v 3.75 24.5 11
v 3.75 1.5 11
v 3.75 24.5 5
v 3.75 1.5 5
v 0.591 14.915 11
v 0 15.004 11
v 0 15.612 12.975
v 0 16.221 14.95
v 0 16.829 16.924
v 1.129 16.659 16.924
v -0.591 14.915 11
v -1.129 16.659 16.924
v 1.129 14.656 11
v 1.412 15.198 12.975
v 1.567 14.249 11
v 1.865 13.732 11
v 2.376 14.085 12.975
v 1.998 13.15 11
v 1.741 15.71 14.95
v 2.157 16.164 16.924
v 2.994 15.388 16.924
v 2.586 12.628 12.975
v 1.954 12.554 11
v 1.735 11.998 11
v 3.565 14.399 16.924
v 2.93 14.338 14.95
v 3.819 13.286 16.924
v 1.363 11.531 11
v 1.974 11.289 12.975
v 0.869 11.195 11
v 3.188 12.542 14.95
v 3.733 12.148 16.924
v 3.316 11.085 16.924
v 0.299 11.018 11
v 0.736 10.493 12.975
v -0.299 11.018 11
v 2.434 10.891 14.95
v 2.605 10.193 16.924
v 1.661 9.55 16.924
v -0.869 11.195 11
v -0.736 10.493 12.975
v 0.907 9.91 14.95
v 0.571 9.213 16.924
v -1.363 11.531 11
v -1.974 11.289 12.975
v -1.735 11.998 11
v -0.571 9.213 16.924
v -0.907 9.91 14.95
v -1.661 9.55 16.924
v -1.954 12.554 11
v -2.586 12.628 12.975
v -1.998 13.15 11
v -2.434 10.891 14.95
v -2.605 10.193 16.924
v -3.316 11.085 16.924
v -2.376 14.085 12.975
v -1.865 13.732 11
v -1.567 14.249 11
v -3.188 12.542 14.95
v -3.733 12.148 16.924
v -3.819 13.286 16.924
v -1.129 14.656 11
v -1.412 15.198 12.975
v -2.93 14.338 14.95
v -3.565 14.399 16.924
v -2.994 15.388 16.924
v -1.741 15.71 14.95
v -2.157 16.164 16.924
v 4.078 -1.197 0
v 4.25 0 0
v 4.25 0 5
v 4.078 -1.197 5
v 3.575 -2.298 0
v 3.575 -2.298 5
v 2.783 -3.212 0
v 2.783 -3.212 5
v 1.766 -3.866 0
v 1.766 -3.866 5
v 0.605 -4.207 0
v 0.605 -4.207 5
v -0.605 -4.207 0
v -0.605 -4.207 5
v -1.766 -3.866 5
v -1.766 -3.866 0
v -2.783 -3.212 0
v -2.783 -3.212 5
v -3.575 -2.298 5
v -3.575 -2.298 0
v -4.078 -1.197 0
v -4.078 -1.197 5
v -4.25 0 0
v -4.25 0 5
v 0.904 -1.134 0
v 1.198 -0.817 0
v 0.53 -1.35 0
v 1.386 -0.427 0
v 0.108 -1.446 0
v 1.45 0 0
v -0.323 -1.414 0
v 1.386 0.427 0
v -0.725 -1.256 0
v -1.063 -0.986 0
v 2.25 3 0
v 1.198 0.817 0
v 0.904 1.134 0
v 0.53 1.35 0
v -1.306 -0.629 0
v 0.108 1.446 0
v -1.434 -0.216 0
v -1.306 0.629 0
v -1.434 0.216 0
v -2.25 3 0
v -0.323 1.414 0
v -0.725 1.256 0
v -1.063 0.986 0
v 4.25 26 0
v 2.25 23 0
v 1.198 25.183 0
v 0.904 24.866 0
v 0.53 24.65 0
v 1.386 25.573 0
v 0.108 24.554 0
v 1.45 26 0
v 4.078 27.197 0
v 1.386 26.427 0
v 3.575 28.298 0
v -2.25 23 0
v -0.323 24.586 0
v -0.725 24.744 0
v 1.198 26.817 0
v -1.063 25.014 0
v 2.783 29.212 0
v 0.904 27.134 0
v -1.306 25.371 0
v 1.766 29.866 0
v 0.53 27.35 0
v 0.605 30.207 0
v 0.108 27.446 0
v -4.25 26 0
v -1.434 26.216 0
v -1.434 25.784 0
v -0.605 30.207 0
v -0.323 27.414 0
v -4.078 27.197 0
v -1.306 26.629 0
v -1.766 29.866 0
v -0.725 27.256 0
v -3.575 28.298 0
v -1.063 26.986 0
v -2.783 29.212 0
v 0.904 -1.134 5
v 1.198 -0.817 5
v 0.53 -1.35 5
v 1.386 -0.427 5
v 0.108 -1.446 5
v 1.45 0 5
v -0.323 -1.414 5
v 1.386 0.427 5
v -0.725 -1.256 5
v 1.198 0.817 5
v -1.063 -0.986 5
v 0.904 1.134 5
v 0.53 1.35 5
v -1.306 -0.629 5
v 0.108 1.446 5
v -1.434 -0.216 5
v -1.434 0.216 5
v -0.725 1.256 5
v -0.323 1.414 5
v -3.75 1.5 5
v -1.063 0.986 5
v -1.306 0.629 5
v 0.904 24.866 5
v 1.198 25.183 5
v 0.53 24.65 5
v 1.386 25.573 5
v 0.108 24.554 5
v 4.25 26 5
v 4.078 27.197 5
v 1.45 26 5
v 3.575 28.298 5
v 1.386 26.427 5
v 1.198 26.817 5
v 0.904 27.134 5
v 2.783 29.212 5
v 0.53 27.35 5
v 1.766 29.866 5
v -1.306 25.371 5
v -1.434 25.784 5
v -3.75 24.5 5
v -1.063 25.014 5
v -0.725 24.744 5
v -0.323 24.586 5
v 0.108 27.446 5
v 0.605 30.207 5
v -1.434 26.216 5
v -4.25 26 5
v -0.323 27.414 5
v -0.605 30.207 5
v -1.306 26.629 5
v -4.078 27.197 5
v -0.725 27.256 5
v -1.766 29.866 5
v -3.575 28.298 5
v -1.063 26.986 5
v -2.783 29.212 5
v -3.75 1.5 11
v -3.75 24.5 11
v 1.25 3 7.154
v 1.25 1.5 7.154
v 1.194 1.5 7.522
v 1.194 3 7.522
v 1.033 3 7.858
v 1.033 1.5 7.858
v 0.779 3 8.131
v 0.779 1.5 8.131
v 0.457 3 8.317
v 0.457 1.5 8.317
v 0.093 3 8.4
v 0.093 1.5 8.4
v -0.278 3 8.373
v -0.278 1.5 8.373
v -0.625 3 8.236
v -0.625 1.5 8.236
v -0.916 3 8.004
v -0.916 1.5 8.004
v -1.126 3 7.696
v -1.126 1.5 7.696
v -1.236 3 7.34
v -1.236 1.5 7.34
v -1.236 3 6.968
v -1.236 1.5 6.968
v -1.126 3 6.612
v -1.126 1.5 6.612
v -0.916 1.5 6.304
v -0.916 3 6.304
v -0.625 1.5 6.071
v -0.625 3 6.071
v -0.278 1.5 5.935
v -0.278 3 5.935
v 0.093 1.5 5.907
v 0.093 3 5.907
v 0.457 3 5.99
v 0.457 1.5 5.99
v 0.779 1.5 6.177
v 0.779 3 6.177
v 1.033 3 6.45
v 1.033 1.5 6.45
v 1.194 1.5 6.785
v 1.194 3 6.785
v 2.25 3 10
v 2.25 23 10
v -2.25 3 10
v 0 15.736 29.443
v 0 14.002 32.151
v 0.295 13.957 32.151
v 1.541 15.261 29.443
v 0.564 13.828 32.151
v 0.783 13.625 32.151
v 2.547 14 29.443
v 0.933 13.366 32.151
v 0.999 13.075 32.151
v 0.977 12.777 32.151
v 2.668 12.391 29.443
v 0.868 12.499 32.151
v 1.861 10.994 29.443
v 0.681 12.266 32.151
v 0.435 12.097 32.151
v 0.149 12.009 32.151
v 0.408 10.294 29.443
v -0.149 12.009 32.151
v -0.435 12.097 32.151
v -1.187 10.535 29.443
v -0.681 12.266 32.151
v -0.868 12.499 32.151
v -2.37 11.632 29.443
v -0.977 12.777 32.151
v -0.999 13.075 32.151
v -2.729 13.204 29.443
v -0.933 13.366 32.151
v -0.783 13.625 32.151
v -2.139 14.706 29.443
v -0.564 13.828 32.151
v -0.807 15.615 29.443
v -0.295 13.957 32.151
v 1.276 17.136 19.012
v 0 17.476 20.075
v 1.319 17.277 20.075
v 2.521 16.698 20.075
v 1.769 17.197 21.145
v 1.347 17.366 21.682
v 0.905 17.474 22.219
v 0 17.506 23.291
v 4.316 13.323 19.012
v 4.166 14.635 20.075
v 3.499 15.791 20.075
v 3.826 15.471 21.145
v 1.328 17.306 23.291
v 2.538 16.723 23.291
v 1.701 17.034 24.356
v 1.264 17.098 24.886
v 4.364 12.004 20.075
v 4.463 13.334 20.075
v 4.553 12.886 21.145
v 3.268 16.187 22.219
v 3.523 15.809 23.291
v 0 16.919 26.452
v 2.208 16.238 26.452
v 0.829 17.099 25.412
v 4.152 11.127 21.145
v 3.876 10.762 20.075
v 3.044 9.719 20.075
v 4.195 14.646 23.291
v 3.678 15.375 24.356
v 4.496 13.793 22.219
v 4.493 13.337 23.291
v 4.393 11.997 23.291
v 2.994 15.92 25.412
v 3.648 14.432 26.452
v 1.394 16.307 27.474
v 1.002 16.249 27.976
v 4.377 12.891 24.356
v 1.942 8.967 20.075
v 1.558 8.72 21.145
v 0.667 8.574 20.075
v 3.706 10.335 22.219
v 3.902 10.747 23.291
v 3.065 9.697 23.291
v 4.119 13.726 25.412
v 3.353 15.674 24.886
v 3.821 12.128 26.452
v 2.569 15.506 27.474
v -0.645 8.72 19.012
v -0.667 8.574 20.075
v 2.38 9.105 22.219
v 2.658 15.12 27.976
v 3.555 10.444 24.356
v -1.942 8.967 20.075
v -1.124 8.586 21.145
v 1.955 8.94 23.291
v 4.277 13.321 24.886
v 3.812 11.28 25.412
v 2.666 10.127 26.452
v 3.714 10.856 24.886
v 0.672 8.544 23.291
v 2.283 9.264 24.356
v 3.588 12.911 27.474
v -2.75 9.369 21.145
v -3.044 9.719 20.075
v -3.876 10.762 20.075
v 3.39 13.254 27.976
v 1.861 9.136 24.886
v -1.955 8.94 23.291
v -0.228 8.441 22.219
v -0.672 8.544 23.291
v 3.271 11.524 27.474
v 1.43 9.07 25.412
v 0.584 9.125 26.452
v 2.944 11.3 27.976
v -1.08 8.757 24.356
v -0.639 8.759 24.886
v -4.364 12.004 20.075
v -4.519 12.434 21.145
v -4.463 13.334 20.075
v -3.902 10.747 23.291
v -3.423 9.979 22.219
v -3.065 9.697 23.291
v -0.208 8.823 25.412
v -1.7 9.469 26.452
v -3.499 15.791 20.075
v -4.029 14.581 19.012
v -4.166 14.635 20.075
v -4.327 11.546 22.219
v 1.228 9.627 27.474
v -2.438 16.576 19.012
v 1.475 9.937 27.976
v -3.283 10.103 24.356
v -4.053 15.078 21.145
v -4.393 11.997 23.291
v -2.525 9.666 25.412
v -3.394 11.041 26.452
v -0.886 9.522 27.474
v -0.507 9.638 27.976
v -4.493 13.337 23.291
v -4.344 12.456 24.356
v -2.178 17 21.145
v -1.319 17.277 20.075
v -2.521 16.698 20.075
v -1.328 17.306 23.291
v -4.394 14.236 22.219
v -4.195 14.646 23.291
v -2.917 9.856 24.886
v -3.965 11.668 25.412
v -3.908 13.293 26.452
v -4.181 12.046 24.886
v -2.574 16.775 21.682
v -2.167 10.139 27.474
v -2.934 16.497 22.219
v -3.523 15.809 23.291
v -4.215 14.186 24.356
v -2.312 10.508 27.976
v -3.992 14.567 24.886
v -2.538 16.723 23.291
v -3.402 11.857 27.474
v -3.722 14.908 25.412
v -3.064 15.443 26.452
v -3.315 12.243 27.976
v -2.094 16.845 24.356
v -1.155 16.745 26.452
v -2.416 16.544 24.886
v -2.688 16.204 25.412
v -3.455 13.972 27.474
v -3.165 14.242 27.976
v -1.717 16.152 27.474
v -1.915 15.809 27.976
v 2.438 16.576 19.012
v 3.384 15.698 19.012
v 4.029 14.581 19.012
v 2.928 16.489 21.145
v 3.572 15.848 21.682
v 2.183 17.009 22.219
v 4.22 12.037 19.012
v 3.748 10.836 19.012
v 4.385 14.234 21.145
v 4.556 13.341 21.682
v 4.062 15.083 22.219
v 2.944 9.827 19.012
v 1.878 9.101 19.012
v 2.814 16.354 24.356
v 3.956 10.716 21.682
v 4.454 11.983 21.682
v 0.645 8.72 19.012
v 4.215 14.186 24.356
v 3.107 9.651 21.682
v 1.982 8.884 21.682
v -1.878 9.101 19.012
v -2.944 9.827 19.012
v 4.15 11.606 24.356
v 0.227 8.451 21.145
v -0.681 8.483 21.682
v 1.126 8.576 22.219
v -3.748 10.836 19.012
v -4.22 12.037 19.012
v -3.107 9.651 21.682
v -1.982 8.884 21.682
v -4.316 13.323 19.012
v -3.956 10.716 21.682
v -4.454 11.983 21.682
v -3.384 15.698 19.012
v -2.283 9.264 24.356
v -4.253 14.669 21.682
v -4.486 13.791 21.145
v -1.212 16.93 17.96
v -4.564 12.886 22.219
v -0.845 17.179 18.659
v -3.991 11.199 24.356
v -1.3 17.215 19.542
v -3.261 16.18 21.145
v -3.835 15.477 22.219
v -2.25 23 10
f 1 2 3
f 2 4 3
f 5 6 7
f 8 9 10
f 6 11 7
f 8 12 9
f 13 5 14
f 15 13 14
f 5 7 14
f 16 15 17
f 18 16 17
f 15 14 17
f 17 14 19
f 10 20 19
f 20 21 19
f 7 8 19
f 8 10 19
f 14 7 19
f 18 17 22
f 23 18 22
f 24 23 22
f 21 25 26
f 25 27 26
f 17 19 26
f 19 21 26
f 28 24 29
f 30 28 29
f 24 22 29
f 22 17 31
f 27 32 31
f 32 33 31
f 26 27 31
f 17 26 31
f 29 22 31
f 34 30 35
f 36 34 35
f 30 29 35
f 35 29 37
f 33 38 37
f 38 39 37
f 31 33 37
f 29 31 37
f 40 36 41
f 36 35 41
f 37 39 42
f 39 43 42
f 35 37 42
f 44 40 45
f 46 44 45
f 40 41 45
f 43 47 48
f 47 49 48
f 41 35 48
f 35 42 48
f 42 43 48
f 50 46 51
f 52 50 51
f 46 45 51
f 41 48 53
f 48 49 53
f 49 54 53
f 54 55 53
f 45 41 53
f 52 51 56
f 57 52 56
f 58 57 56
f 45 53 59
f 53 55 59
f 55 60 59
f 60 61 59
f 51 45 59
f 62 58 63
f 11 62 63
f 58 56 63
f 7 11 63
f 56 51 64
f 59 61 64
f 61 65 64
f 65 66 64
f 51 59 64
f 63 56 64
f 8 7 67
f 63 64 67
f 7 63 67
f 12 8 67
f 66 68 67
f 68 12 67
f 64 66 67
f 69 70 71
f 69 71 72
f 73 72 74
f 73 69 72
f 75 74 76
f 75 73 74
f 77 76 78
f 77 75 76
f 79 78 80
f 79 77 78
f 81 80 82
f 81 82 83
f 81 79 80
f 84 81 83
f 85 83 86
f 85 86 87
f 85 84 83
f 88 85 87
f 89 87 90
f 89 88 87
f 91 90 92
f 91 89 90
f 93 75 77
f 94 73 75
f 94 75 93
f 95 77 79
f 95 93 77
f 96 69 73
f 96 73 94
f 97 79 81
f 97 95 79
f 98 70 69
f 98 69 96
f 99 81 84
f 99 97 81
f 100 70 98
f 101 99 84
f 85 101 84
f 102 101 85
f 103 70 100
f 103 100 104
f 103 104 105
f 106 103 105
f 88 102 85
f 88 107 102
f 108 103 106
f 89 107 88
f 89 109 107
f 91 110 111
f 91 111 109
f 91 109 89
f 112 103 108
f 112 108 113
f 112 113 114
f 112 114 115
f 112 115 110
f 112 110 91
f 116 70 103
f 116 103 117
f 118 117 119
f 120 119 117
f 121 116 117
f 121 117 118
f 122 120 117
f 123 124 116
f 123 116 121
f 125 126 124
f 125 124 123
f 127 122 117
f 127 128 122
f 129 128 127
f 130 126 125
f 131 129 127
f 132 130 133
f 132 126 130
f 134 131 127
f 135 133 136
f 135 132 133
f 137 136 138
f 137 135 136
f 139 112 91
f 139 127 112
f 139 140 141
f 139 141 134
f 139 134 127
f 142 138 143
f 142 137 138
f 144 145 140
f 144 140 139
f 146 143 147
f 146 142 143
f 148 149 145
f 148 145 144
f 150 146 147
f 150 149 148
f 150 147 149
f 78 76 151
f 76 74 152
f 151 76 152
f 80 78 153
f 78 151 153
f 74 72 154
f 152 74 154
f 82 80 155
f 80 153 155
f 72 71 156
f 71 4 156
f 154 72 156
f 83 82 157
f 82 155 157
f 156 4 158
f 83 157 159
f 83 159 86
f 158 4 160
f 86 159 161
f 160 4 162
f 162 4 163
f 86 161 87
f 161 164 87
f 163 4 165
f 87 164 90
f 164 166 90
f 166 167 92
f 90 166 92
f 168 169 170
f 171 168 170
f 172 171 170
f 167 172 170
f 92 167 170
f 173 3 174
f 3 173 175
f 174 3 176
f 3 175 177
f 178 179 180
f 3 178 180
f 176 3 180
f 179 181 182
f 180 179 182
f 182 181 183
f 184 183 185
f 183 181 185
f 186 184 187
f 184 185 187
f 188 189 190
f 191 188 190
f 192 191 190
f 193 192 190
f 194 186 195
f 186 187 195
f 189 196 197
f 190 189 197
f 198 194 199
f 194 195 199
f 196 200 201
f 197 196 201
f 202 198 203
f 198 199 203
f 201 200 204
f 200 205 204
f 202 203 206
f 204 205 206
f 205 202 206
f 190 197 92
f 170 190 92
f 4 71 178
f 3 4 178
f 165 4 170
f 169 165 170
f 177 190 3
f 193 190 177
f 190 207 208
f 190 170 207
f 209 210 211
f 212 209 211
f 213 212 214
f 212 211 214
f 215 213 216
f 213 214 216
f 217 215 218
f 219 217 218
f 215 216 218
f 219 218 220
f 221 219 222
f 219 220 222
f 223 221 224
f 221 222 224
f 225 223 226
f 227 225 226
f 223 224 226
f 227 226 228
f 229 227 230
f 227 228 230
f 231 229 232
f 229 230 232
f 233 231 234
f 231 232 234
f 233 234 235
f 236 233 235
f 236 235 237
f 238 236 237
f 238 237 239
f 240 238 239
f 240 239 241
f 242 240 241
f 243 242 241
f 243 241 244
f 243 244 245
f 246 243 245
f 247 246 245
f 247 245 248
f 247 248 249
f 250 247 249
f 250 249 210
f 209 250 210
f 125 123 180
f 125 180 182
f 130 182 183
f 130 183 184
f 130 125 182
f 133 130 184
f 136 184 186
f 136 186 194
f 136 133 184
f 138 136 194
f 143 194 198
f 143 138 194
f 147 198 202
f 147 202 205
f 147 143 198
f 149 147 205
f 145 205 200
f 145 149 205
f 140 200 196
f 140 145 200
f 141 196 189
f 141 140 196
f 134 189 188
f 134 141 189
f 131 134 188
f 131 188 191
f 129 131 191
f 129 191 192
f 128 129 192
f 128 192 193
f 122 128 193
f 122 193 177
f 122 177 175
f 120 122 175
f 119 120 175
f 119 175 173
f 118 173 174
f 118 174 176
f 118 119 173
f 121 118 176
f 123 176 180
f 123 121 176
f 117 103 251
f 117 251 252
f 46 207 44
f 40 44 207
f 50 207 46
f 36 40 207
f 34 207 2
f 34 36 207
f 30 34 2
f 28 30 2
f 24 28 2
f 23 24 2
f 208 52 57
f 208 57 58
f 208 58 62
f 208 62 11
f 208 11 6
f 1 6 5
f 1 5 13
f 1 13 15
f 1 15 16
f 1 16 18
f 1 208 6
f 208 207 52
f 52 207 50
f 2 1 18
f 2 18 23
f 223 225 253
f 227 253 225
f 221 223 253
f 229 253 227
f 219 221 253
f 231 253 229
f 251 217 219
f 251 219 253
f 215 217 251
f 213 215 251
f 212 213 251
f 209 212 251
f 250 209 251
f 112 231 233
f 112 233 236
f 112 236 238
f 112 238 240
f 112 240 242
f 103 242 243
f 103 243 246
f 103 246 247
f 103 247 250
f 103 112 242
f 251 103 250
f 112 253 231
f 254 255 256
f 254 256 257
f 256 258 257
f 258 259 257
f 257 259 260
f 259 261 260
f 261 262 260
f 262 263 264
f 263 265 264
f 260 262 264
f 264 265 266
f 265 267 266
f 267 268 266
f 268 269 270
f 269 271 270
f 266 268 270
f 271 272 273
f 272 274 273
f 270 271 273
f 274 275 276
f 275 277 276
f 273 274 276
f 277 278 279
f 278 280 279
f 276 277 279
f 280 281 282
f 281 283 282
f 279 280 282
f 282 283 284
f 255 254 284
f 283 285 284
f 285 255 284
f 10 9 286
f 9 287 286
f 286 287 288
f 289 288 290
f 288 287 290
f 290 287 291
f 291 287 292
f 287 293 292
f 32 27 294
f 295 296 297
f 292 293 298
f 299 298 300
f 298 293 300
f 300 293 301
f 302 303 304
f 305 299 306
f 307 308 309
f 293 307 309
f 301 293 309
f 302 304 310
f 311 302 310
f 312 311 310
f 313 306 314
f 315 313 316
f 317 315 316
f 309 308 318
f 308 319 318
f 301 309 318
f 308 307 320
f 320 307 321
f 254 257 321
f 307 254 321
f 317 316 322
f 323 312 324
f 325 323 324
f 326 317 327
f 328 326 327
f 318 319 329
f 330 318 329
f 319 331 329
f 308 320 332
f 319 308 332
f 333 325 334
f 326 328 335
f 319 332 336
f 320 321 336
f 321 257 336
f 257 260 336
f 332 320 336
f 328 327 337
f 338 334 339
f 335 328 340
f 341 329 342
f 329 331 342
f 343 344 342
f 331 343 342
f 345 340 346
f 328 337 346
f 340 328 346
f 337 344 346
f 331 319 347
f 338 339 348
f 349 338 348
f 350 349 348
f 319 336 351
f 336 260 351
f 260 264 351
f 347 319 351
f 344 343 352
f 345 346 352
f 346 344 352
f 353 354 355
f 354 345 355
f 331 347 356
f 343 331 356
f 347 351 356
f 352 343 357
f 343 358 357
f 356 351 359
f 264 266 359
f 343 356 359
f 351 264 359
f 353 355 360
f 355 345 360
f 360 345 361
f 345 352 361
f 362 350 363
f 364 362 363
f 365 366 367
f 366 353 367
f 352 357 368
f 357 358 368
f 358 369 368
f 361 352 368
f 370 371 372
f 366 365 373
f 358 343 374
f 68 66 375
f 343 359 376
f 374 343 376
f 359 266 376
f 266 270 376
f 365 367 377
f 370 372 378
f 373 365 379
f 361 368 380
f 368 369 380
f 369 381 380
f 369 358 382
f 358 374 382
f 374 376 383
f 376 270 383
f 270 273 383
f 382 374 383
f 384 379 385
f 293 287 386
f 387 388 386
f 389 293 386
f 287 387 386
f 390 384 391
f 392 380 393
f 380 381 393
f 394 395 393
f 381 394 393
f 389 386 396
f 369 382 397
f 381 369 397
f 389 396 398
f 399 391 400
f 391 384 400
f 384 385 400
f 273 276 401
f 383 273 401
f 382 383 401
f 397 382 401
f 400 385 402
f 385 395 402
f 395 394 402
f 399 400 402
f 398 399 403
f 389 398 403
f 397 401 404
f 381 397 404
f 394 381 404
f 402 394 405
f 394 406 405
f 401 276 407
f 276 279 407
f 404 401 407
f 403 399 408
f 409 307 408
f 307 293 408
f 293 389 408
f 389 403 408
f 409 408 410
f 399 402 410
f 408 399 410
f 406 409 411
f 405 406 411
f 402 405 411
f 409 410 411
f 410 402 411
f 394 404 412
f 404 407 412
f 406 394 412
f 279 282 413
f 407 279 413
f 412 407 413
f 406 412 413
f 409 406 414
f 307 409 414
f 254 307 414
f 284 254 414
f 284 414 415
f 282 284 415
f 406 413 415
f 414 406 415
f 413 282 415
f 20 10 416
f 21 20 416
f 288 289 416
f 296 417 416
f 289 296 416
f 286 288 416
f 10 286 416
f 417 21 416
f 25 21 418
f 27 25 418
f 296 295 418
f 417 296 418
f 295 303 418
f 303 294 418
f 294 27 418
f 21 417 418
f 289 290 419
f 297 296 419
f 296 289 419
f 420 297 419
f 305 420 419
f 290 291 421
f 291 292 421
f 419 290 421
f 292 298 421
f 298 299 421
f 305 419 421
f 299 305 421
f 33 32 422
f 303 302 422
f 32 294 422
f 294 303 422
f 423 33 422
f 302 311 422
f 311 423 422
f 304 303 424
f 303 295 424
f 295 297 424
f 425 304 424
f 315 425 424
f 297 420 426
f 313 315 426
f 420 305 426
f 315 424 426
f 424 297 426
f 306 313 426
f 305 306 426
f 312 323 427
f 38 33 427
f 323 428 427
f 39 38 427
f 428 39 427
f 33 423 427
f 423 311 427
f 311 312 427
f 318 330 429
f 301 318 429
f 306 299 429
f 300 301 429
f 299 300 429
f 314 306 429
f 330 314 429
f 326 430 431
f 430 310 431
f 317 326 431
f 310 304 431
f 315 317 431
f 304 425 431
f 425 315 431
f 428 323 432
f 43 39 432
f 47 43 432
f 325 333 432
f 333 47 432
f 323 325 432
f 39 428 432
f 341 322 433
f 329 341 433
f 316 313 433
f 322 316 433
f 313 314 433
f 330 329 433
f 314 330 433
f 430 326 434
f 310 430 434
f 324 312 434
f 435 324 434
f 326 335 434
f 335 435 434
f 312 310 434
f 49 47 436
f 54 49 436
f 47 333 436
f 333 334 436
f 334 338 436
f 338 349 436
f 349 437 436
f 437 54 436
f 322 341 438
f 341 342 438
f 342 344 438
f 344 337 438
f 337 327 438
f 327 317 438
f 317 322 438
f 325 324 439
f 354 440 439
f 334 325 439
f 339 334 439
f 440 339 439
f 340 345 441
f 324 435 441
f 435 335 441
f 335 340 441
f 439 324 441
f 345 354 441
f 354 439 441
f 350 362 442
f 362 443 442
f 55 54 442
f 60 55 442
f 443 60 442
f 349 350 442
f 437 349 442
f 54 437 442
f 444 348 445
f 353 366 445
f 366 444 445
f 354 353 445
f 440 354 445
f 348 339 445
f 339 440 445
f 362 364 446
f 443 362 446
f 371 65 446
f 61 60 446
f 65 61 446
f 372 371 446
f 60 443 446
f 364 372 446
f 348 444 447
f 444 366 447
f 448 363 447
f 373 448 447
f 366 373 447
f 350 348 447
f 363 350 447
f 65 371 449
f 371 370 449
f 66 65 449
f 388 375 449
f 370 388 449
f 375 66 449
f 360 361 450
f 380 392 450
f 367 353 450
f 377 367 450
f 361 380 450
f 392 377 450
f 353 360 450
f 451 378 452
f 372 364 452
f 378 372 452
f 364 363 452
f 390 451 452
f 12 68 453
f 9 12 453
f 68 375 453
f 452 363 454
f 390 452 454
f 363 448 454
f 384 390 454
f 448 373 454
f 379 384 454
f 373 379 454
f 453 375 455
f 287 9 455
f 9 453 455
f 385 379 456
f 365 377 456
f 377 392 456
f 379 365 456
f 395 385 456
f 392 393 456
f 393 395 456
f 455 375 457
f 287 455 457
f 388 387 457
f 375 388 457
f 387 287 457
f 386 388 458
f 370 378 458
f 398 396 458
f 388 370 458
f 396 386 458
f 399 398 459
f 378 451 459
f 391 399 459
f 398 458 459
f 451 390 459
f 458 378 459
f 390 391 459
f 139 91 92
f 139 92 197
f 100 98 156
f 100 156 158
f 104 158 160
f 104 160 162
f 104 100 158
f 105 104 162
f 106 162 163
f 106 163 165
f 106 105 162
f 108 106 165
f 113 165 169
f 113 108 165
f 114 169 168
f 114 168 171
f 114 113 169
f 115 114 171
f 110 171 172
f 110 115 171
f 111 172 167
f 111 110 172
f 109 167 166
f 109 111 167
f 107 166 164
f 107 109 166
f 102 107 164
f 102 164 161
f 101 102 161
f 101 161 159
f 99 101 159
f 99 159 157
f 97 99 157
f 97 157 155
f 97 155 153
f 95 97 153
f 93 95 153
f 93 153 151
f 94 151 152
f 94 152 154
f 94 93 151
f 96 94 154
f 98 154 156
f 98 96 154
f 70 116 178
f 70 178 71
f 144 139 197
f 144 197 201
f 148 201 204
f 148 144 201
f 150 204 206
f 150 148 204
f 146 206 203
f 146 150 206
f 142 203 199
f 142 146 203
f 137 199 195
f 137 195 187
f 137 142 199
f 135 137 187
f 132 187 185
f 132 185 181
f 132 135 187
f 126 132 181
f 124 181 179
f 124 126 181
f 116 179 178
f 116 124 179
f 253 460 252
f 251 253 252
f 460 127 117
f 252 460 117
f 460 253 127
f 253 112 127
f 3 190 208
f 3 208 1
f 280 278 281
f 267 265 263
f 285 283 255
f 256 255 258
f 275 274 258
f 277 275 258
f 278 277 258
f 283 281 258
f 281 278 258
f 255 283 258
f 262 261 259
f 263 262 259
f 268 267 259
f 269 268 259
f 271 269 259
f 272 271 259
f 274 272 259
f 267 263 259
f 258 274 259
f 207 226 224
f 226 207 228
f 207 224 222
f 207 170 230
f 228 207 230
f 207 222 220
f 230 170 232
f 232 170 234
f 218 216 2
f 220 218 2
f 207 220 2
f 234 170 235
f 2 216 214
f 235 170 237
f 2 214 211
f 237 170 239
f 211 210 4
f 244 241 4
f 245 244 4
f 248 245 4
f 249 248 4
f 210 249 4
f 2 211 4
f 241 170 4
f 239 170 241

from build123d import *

# Parameters (mm, degrees)
SKETCH1_R           = 1.45
SKETCH1_W           = 4.5
SKETCH1_H           = 20
BOSS_EXTRUDE1_DEPTH = 5
SKETCH2_W           = 7.5
SKETCH2_H           = 23
SKETCH2_W_2         = 4.5
SKETCH2_H_2         = 20
BOSS_EXTRUDE2_DEPTH = 5
SKETCH3_W           = 7.5
SKETCH3_H           = 23
BOSS_EXTRUDE3_DEPTH = 1
CUT_EXTRUDE1_REACH  = 45.372
SKETCH6_R           = 1.25


with BuildPart() as part:
    # Sketch1 → Boss-Extrude1 (new body)
    with BuildSketch(Plane.XY):
        with BuildLine():
            Line((-4.25, 0), (-4.25, 26))
            ThreePointArc((-4.25, 26), (0, 30.25), (4.25, 26))
            Line((4.25, 26), (4.25, 0))
            ThreePointArc((4.25, 0), (0, -4.25), (-4.25, 0))
        make_face()
        with Locations((0, 26)):
            Circle(SKETCH1_R, mode=Mode.SUBTRACT)
        Circle(SKETCH1_R, mode=Mode.SUBTRACT)
        with Locations((0, 13)):
            Rectangle(SKETCH1_W, SKETCH1_H, mode=Mode.SUBTRACT)
    extrude(amount=BOSS_EXTRUDE1_DEPTH)

    # Sketch2 → Boss-Extrude2 (add)
    with BuildSketch(Plane.XY.offset(5)):
        with Locations((0, 13)):
            Rectangle(SKETCH2_W, SKETCH2_H)
        with Locations((0, 13)):
            Rectangle(SKETCH2_W_2, SKETCH2_H_2, mode=Mode.SUBTRACT)
    extrude(amount=BOSS_EXTRUDE2_DEPTH)

    # Sketch3 → Boss-Extrude3 (add)
    with BuildSketch(Plane.XY.offset(10)):
        with Locations((0, 13)):
            Rectangle(SKETCH3_W, SKETCH3_H)
    extrude(amount=BOSS_EXTRUDE3_DEPTH)

    # Sketch5 → Revolve1 (revolve)
    with BuildSketch(Plane(origin=(0, 0, 0), x_dir=(0, 0, -1), z_dir=(1, 0, 0))):
        with BuildLine():
            Line((-11, 13), (-11, 15.003893641))
            Line((-11, 15.003893641), (-16.924450419, 16.829327494))
            ThreePointArc((-16.924450419, 16.829327494), (-24.885658953, 17.288779267), (-32.151240121, 14.001946821))
            Line((-32.151240121, 14.001946821), (-32.151240121, 13))
            Line((-32.151240121, 13), (-11, 13))
        make_face()
    revolve(axis=Axis((0, 13, 32.151240121), (0, 0, -1)))

    # Sketch6 → Cut-Extrude1 (cut, up to next)
    with BuildSketch(Plane.XZ.offset(-1.5), mode=Mode.PRIVATE) as cut_extrude1_sk1:
        with Locations((0, 7.153891294)):
            Circle(SKETCH6_R)
    cut_extrude1_tool1 = extrude(cut_extrude1_sk1.sketch, amount=-CUT_EXTRUDE1_REACH, mode=Mode.PRIVATE) & part.part
    add(cut_extrude1_tool1.solids().sort_by_distance((0, 1.5, 7.153891))[0], mode=Mode.SUBTRACT)


solid = part.part
